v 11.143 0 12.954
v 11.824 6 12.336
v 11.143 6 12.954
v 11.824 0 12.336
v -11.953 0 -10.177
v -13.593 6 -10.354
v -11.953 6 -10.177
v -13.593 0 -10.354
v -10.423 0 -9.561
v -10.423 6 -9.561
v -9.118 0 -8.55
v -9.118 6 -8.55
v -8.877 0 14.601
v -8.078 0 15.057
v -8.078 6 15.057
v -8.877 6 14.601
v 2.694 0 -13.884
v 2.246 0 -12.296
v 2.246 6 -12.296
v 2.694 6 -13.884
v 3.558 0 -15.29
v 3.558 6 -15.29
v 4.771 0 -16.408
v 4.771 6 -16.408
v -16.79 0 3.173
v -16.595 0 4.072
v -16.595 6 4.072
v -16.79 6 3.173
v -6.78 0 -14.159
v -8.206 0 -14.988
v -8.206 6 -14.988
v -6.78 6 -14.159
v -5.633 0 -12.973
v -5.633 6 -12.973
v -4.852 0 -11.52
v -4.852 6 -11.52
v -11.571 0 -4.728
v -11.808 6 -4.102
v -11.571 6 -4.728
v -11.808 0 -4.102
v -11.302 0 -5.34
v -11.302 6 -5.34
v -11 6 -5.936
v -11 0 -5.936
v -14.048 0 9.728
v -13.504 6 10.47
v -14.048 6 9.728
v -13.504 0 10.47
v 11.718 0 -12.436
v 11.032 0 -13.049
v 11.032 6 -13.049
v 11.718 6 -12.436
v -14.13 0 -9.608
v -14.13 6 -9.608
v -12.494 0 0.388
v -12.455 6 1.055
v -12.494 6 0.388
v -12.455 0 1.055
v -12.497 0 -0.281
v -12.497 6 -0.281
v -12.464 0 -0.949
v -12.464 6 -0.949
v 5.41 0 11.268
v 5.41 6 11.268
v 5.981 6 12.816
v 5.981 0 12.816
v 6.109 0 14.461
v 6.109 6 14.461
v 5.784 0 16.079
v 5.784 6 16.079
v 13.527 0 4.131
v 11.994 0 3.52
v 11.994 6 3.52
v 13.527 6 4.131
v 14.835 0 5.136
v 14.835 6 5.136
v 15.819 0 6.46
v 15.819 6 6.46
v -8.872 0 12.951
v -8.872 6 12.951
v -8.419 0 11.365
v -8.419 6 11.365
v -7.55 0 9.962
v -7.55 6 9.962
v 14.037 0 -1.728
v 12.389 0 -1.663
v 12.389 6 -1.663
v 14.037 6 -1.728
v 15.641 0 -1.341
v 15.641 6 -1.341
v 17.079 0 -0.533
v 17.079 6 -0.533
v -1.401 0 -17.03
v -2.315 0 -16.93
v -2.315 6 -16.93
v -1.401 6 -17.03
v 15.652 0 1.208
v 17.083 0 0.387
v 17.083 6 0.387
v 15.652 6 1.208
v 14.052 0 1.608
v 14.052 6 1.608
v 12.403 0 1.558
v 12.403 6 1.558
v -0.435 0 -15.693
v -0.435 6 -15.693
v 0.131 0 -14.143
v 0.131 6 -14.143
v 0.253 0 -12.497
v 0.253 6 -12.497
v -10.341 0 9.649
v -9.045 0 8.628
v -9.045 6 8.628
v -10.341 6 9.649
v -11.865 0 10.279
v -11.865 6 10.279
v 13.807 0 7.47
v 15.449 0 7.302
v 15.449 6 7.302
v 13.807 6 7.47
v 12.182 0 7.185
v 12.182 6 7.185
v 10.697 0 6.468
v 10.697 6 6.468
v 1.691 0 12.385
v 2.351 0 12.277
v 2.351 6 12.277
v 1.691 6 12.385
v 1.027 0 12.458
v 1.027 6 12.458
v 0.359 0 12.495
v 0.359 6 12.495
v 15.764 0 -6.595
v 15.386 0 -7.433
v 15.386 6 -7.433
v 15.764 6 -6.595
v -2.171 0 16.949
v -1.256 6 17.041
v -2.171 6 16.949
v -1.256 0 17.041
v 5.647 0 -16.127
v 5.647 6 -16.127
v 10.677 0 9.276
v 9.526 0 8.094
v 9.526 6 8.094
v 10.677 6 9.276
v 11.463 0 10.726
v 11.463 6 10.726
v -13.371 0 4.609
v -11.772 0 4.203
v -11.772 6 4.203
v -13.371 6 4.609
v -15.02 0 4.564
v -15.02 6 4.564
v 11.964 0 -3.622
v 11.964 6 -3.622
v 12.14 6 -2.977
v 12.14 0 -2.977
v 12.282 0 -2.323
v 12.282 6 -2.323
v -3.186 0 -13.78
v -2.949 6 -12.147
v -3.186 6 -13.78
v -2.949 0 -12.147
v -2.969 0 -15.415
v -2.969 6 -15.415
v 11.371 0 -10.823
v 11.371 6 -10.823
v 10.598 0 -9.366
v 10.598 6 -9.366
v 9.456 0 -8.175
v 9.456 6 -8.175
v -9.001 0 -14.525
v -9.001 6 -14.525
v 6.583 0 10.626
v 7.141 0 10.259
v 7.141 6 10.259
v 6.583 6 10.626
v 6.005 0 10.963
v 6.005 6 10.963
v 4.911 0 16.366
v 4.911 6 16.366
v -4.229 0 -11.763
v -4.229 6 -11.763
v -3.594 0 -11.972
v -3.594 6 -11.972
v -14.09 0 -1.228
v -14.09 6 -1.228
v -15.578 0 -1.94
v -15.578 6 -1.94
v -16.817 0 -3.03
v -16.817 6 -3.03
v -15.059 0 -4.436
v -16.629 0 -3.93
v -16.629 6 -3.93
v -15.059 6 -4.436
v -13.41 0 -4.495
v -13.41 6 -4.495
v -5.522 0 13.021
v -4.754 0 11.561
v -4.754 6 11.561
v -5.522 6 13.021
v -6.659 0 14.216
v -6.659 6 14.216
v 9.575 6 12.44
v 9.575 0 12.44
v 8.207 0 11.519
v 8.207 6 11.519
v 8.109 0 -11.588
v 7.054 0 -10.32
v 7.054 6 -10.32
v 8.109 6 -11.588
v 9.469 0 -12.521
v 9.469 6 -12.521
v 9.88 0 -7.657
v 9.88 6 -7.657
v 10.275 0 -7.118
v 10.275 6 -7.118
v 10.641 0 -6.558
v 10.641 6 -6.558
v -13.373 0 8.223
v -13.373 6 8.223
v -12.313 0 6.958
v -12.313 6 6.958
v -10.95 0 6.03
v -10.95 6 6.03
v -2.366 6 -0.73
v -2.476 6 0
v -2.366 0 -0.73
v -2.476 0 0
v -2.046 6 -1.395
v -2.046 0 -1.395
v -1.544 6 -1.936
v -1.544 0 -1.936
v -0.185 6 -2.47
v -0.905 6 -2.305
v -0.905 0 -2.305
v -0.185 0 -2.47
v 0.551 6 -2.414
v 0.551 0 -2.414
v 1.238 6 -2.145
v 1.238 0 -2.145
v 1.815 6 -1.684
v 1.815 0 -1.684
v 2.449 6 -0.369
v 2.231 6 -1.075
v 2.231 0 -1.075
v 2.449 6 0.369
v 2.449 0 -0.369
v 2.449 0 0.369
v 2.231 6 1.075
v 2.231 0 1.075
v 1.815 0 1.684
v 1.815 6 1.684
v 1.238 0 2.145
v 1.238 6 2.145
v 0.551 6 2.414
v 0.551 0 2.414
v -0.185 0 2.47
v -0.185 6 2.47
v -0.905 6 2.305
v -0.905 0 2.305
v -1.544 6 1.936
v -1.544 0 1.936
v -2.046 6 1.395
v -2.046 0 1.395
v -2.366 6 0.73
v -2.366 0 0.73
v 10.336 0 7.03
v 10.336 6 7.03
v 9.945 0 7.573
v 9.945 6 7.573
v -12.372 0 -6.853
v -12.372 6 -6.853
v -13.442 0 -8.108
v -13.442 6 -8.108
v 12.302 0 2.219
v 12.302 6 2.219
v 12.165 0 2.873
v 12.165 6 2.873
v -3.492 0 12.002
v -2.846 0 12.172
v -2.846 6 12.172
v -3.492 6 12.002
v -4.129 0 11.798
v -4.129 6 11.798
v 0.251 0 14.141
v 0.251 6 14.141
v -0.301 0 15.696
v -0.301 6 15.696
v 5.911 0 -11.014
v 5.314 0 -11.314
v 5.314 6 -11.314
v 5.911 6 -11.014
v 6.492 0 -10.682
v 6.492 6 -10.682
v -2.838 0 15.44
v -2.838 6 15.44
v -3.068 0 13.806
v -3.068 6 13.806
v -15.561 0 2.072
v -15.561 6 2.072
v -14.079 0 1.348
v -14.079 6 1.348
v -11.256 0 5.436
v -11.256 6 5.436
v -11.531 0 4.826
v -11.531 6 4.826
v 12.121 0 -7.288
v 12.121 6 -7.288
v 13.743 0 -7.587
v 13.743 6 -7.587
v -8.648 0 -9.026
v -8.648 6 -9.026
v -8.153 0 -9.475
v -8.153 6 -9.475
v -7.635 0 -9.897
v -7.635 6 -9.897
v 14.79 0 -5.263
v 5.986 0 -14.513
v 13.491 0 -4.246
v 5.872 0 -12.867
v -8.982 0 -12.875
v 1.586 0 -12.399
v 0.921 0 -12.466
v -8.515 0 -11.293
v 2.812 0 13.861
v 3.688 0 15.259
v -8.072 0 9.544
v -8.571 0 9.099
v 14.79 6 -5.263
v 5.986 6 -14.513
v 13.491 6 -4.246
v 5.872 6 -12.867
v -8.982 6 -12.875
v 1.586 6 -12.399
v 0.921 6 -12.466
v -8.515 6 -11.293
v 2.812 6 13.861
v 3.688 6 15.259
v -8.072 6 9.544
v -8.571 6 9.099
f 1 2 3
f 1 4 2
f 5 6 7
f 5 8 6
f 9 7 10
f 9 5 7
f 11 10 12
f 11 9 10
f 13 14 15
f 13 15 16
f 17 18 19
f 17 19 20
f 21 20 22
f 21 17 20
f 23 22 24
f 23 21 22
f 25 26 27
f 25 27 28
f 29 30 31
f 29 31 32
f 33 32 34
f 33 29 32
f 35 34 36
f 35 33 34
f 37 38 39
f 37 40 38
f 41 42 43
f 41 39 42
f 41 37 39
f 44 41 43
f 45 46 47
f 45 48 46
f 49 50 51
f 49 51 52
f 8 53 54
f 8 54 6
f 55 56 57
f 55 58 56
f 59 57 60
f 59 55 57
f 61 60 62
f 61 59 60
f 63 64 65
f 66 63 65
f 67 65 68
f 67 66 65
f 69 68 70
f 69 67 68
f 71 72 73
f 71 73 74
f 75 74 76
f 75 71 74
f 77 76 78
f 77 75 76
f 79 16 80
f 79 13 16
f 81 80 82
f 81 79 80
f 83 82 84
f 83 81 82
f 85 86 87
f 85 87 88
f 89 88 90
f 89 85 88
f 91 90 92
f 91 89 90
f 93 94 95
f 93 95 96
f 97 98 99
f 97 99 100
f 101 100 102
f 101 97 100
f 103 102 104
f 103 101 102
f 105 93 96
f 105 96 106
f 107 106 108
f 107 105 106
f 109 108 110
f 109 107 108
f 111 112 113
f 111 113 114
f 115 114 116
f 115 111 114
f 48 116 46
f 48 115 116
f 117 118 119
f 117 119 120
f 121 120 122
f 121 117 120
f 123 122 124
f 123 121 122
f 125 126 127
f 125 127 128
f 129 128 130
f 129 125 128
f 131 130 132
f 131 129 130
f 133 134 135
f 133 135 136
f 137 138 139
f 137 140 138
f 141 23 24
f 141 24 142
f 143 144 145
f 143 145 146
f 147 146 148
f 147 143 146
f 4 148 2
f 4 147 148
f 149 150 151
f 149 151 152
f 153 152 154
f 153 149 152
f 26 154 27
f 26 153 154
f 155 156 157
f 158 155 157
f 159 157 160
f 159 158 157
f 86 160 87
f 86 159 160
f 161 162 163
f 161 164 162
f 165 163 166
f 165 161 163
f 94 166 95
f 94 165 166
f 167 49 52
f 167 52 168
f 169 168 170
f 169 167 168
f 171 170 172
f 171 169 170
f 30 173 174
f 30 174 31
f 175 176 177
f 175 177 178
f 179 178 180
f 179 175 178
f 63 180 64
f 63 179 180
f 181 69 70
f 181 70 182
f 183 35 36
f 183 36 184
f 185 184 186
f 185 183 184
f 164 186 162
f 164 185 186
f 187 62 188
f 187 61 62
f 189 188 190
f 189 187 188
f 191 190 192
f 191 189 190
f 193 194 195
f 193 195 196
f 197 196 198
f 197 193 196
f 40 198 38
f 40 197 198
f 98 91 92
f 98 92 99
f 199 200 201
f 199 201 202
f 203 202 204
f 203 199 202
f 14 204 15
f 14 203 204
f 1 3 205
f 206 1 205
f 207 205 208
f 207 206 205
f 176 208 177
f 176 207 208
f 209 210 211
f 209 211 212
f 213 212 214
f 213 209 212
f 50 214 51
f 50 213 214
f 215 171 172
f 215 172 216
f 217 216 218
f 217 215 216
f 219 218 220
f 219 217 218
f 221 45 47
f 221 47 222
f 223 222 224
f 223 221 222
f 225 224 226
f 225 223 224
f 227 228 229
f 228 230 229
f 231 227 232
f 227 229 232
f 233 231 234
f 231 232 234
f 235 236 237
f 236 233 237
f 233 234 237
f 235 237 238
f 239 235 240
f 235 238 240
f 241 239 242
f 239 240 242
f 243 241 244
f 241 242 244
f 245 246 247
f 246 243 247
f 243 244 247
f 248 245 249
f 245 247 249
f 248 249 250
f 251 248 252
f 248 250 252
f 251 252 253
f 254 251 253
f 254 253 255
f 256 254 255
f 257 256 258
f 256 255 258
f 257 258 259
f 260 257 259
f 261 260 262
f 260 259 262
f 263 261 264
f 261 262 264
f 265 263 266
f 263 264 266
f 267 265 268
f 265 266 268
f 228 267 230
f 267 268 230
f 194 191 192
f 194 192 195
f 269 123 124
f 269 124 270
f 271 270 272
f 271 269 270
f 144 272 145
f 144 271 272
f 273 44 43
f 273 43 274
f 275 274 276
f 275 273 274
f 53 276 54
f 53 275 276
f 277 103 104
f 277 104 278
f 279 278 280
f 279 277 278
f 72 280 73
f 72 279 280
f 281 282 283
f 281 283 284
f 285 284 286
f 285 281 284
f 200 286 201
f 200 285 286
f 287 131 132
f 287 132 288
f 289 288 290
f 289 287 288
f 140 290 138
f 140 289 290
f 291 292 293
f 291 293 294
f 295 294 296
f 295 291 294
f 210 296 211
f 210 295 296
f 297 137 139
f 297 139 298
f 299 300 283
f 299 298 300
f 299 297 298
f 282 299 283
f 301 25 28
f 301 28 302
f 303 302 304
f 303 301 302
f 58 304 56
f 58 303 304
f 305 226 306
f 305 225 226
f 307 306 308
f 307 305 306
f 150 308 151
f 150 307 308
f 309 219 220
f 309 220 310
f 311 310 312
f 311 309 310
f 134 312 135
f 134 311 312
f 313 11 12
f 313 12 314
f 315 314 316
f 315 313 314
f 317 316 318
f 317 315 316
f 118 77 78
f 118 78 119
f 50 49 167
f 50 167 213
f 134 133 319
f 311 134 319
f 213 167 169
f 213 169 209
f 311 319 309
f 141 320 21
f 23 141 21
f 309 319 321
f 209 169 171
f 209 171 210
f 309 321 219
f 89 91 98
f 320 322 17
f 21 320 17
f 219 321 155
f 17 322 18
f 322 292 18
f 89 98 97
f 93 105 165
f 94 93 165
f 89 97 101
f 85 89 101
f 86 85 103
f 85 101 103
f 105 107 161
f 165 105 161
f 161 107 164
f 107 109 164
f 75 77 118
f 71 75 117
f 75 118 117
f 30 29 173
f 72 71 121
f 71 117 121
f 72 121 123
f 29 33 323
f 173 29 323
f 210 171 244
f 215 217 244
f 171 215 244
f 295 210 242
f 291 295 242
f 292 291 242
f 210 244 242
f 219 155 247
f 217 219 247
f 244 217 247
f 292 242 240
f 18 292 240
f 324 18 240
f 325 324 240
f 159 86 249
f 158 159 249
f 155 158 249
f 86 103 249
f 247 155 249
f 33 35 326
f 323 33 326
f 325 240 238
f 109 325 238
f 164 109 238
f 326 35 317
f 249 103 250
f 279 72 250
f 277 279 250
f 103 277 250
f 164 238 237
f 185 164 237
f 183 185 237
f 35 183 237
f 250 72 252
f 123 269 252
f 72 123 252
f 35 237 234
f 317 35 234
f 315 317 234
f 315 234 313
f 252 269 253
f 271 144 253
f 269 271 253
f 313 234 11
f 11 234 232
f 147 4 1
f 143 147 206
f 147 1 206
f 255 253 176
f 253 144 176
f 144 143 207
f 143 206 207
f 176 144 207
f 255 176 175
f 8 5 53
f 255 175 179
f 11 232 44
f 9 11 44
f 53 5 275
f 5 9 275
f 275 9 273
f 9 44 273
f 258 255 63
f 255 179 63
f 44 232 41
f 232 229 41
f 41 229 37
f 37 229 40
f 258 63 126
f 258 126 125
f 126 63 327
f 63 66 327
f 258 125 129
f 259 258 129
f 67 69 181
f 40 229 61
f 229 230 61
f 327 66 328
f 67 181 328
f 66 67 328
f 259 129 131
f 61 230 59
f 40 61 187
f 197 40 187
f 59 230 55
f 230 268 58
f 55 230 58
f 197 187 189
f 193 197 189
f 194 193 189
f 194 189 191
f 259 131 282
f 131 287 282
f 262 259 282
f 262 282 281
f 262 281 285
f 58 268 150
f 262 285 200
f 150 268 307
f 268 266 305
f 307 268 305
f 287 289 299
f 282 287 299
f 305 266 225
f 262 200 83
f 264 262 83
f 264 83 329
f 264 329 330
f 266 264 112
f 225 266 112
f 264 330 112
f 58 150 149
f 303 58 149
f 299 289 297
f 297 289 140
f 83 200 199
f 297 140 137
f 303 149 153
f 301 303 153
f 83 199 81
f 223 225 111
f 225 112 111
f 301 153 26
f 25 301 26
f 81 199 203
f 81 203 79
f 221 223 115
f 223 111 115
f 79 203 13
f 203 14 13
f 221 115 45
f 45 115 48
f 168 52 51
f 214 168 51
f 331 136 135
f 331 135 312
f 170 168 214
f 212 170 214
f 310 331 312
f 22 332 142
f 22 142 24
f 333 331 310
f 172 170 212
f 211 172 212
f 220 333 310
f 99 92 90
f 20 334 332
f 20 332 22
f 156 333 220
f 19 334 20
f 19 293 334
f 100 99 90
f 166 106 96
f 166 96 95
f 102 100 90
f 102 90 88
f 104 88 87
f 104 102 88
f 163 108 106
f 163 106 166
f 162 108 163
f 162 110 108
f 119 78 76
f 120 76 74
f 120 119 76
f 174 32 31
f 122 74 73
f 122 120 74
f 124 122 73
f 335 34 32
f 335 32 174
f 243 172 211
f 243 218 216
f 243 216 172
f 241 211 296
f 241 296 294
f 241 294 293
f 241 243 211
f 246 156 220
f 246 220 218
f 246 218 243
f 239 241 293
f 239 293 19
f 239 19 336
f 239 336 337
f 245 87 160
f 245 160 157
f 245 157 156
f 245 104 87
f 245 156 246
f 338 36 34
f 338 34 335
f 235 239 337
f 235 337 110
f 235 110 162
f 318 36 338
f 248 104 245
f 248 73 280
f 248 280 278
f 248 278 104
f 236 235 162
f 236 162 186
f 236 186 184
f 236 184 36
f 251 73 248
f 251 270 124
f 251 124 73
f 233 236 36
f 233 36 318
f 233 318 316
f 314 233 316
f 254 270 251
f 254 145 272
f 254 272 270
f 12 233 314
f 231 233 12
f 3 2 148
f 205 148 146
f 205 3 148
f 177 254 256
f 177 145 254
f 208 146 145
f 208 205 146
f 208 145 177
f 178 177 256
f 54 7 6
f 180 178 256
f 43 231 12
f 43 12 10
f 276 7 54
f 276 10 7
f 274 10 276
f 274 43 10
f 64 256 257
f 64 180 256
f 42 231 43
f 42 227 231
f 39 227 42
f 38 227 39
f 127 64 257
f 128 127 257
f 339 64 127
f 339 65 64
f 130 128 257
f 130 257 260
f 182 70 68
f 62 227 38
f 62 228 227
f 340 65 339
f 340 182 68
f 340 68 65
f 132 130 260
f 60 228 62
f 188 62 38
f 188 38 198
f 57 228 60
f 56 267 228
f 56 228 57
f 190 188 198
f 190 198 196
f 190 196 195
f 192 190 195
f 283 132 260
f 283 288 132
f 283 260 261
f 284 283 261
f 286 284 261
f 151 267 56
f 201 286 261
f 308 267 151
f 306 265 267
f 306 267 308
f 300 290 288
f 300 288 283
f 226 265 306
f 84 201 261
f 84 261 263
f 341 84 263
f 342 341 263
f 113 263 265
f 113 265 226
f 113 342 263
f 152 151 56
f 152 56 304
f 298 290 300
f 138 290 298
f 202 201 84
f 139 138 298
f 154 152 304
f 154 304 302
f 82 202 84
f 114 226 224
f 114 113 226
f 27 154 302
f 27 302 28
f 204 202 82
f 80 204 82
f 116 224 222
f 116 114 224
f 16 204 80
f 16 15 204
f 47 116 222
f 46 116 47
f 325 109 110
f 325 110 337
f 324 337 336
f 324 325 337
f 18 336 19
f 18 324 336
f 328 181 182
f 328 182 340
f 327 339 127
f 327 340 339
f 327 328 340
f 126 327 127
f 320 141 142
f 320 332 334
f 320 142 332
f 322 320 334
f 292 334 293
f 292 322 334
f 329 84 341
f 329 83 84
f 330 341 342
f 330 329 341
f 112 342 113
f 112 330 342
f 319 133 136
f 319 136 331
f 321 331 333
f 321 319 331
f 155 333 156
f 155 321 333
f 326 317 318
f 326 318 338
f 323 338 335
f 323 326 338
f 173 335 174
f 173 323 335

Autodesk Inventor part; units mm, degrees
ref_plane "YZ Plane" through (0, 0, 0) normal (1, 0, 0) x (0, 1, 0)
ref_plane "XZ Plane" through (0, 0, 0) normal (0, 1, 0) x (-1, 0, 0)
ref_plane "XY Plane" through (0, 0, 0) normal (0, 0, 1) x (1, 0, 0)
sketch "Sketch1" plane through (0, 0, 0) normal (0, 1, 0) x (-1, 0, 0)
  circle A0 centre (0, 0) radius 2.4765
  circle A1 centre (-8.1903, -11.4773) radius 6 construction
  circle A2 centre (0, -14.1) radius 6 construction
  line L0 (0, -14.1) -> (-8.1903, -11.4773) construction
  circle A3 centre (-8.1903, -11.4773) radius 5.3 construction
  circle A4 centre (0, -14.1) radius 5.3 construction
  line L1 (-4.7712, -16.4078) -> (-5.6471, -16.1273)
  circle A5 centre (0, 0) radius 12.5 construction
  line L2 (-8.1903, -11.4773) -> (0, 0) construction
  arc A6 (-4.7712, -16.4078) -> (-2.2465, -12.2965) centre (-8.1903, -11.4773) ccw
  arc A7 (-5.3141, -11.3142) -> (-5.6471, -16.1273) centre (0, -14.1) ccw
  line L3 (2.3149, -16.9299) -> (1.4006, -17.0299)
  arc A8 (2.3149, -16.9299) -> (2.9491, -12.1471) centre (-2.814, -13.8163) ccw
  arc A9 (-0.2527, -12.4974) -> (1.4006, -17.0299) centre (5.735, -12.881) ccw
  line L4 (9.0008, -14.5246) -> (8.2062, -14.9879)
  arc A10 (9.0008, -14.5246) -> (7.6348, -9.8974) centre (3.0489, -13.7664) ccw
  arc A11 (4.8523, -11.5198) -> (8.2062, -14.9879) centre (10.4783, -9.4347) ccw
  line L5 (14.1303, -9.6079) -> (13.5929, -10.3543)
  arc A12 (14.1303, -9.6079) -> (11.0004, -5.9364) centre (8.3846, -11.3361) ccw
  arc A13 (9.1183, -8.5502) -> (13.5929, -10.3543) centre (13.4099, -4.3571) ccw
  line L6 (16.8166, -3.03) -> (16.6292, -3.9304)
  arc A14 (16.8166, -3.03) -> (12.4639, -0.9489) centre (12.2706, -6.9458) ccw
  arc A15 (11.8077, -4.1023) -> (16.6292, -3.9304) centre (14.0228, 1.4739) ccw
  line L7 (16.5951, 4.0719) -> (16.7902, 3.1731)
  arc A16 (16.5951, 4.0719) -> (11.7723, 4.2027) centre (14.0348, -1.3544) ccw
  arc A17 (12.4554, 1.055) -> (16.7902, 3.1731) centre (12.211, 7.05) ccw
  line L8 (13.5042, 10.4697) -> (14.048, 9.7279)
  arc A18 (13.5042, 10.4697) -> (9.0451, 8.6276) centre (13.3723, 4.4712) ccw
  arc A19 (10.9495, 6.0298) -> (14.048, 9.7279) centre (8.2878, 11.4071) ccw
  line L9 (8.0783, 15.0572) -> (8.8768, 14.6007)
  arc A20 (8.0783, 15.0572) -> (4.754, 11.5607) centre (10.3976, 9.5236) ccw
  arc A21 (7.5503, 9.9621) -> (8.8768, 14.6007) centre (2.9316, 13.7919) ccw
  line L10 (1.2556, 17.0412) -> (2.1707, 16.949)
  arc A22 (1.2556, 17.0412) -> (-0.3592, 12.4948) centre (5.6251, 12.9294) ccw
  arc A23 (2.8456, 12.1718) -> (2.1707, 16.949) centre (-2.9316, 13.7919) ccw
  line L11 (-5.7843, 16.0786) -> (-4.9107, 16.3665)
  arc A24 (-5.7843, 16.0786) -> (-5.4102, 11.2685) centre (-0.1201, 14.0995) ccw
  arc A25 (-2.3511, 12.2769) -> (-4.9107, 16.3665) centre (-8.2878, 11.4071) ccw
  line L12 (-11.824, 12.3359) -> (-11.1431, 12.9542)
  arc A26 (-11.824, 12.3359) -> (-9.5258, 8.0938) centre (-5.8445, 12.8317) ccw
  arc A27 (-7.1413, 10.2592) -> (-11.1431, 12.9542) centre (-12.211, 7.05) ccw
  line L13 (-15.8192, 6.4601) -> (-15.4486, 7.302)
  arc A28 (-15.8192, 6.4601) -> (-11.9943, 3.5195) centre (-10.5583, 9.3452) ccw
  arc A29 (-10.6967, 6.4676) -> (-15.4486, 7.302) centre (-14.0228, 1.4739) ccw
  line L14 (-17.0791, -0.5326) -> (-17.083, 0.3871)
  arc A30 (-17.0791, -0.5326) -> (-12.3888, -1.6633) centre (-13.4465, 4.2428) ccw
  arc A31 (-12.4026, 1.5577) -> (-17.083, 0.3871) centre (-13.4099, -4.3571) ccw
  line L15 (-15.3859, -7.4333) -> (-15.7636, -6.5946)
  arc A32 (-15.3859, -7.4333) -> (-10.6413, -6.5585) centre (-14.0097, -1.5932) ccw
  arc A33 (-11.9639, -3.6216) -> (-15.7636, -6.5946) centre (-10.4783, -9.4347) ccw
  arc A34 (-2.2465, -12.2965) -> (-0.2527, -12.4974) centre (0, 0) ccw
  arc A35 (2.9491, -12.1471) -> (4.8523, -11.5198) centre (0, 0) ccw
  arc A36 (7.6348, -9.8974) -> (9.1183, -8.5502) centre (0, 0) ccw
  arc A37 (11.0004, -5.9364) -> (11.8077, -4.1023) centre (0, 0) ccw
  arc A38 (12.4639, -0.9489) -> (12.4554, 1.055) centre (0, 0) ccw
  arc A39 (11.7723, 4.2027) -> (10.9495, 6.0298) centre (0, 0) ccw
  arc A40 (9.0451, 8.6276) -> (7.5503, 9.9621) centre (0, 0) ccw
  arc A41 (4.754, 11.5607) -> (2.8456, 12.1718) centre (0, 0) ccw
  arc A42 (-0.3592, 12.4948) -> (-2.3511, 12.2769) centre (0, 0) ccw
  arc A43 (-5.4102, 11.2685) -> (-7.1413, 10.2592) centre (0, 0) ccw
  arc A44 (-9.5258, 8.0938) -> (-10.6967, 6.4676) centre (0, 0) ccw
  arc A45 (-11.9943, 3.5195) -> (-12.4026, 1.5577) centre (0, 0) ccw
  arc A46 (-12.3888, -1.6633) -> (-11.9639, -3.6216) centre (0, 0) ccw
  arc A47 (-10.6413, -6.5585) -> (-9.4565, -8.1746) centre (0, 0) ccw
  line L16 (-11.0323, -13.0486) -> (-11.7185, -12.4361)
  arc A48 (-11.0323, -13.0486) -> (-7.0537, -10.3196) centre (-12.1505, -7.1537) ccw
  arc A49 (-9.4565, -8.1746) -> (-11.7185, -12.4361) centre (-5.735, -12.881) ccw
  arc A50 (-7.0537, -10.3196) -> (-5.3141, -11.3142) centre (0, 0) ccw
  point P0 (4.8523, -11.5198)
  point P1 (9.1183, -8.5502)
  point P2 (11.8077, -4.1023)
  point P3 (12.4554, 1.055)
  point P4 (10.9495, 6.0298)
  point P5 (7.5503, 9.9621)
  point P6 (2.8456, 12.1718)
  point P7 (-2.3511, 12.2769)
  point P8 (-7.1413, 10.2592)
  point P9 (-10.6967, 6.4676)
  point P10 (-12.4026, 1.5577)
  point P11 (-11.9639, -3.6216)
  point P12 (-9.4565, -8.1746)
  point P13 (-2.2465, -12.2965)
  point P14 (-0.2527, -12.4974)
  point P15 (2.9491, -12.1471)
  point P16 (4.8523, -11.5198)
  point P17 (7.6348, -9.8974)
  point P18 (9.1183, -8.5502)
  point P19 (11.0004, -5.9364)
  point P20 (11.8077, -4.1023)
  point P21 (12.4639, -0.9489)
  point P22 (12.4554, 1.055)
  point P23 (11.7723, 4.2027)
  point P24 (10.9495, 6.0298)
  point P25 (9.0451, 8.6276)
  point P26 (7.5503, 9.9621)
  point P27 (4.754, 11.5607)
  point P28 (2.8456, 12.1718)
  point P29 (-0.3592, 12.4948)
  point P30 (-2.3511, 12.2769)
  point P31 (-5.4102, 11.2685)
  point P32 (-7.1413, 10.2592)
  point P33 (-9.5258, 8.0938)
  point P34 (-10.6967, 6.4676)
  point P35 (-11.9943, 3.5195)
  point P36 (-12.4026, 1.5577)
  point P37 (-12.3888, -1.6633)
  point P38 (-11.9639, -3.6216)
  point P39 (-10.6413, -6.5585)
  point P40 (-5.3141, -11.3142)
  point P41 (-9.4565, -8.1746)
  point P42 (-7.0537, -10.3196)
  dimension "d3" = 10.6
  dimension "d0" = 4.953
  dimension "d1" = 12
  dimension "d2" = 8.6
  dimension "d4" = 25
  dimension "d5" = 14.1
  dimension "d6" = 14.1
  dimension "d9" = 360
  dimension "d13" = 360
extrude "Extrusion1" add sketch "Sketch1" along normal blind 6
properties part number "Gear_3DPrint"
